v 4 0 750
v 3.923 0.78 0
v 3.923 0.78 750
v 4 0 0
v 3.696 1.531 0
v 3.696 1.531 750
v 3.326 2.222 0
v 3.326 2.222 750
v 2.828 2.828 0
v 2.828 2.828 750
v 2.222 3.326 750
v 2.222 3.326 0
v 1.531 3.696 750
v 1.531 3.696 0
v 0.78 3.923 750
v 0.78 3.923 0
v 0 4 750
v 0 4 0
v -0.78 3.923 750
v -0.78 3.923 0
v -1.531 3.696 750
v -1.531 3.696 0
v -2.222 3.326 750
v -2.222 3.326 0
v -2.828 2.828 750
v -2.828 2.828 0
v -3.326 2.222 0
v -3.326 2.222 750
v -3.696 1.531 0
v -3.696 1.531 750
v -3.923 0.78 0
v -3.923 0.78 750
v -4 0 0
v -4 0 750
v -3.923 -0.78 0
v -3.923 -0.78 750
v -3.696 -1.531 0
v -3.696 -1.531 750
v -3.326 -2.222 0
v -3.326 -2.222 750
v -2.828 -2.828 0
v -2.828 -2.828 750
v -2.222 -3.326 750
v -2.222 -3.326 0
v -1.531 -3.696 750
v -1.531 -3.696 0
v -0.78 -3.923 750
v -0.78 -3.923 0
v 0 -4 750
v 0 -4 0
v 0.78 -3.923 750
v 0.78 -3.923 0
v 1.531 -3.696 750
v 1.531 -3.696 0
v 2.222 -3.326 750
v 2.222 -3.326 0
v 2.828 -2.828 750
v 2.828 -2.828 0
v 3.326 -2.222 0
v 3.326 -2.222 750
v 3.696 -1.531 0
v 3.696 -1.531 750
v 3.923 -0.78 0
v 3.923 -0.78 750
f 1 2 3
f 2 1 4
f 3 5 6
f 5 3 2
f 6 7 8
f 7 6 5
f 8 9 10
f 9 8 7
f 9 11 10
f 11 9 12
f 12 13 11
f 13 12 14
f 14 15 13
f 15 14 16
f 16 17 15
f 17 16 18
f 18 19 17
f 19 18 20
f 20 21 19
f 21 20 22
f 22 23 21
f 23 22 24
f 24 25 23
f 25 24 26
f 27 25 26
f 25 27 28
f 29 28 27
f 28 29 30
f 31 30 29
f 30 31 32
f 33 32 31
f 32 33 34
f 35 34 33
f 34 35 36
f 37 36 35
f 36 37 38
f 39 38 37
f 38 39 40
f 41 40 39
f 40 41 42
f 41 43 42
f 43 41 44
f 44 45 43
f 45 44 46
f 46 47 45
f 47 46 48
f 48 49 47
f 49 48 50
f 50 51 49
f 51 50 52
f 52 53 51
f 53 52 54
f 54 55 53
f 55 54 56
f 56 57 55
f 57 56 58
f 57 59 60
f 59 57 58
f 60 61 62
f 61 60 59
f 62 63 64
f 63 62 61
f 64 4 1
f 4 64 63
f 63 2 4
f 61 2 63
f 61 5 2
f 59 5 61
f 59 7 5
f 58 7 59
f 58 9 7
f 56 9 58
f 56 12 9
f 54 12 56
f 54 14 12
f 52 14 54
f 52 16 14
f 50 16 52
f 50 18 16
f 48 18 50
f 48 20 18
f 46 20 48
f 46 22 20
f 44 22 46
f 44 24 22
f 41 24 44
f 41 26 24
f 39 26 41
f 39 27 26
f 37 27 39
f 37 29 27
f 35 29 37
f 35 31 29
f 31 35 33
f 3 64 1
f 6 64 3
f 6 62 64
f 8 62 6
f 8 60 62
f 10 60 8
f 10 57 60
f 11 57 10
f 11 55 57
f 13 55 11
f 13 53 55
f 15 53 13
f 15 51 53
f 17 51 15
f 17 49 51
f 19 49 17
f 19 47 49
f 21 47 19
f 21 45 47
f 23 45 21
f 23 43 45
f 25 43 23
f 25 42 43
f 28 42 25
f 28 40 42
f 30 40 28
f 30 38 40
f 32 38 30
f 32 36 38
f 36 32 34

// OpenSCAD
/*
    PRĘT ⌀ 8
*/

$fn = 32;

pret_fi8(750,8);
module pret_fi8(wysokosc,srednica)
{
    aluminum = [0.92, 0.92, 0.92];
    color(aluminum,1)
    cylinder(h=wysokosc, d=srednica, center=false);
}
